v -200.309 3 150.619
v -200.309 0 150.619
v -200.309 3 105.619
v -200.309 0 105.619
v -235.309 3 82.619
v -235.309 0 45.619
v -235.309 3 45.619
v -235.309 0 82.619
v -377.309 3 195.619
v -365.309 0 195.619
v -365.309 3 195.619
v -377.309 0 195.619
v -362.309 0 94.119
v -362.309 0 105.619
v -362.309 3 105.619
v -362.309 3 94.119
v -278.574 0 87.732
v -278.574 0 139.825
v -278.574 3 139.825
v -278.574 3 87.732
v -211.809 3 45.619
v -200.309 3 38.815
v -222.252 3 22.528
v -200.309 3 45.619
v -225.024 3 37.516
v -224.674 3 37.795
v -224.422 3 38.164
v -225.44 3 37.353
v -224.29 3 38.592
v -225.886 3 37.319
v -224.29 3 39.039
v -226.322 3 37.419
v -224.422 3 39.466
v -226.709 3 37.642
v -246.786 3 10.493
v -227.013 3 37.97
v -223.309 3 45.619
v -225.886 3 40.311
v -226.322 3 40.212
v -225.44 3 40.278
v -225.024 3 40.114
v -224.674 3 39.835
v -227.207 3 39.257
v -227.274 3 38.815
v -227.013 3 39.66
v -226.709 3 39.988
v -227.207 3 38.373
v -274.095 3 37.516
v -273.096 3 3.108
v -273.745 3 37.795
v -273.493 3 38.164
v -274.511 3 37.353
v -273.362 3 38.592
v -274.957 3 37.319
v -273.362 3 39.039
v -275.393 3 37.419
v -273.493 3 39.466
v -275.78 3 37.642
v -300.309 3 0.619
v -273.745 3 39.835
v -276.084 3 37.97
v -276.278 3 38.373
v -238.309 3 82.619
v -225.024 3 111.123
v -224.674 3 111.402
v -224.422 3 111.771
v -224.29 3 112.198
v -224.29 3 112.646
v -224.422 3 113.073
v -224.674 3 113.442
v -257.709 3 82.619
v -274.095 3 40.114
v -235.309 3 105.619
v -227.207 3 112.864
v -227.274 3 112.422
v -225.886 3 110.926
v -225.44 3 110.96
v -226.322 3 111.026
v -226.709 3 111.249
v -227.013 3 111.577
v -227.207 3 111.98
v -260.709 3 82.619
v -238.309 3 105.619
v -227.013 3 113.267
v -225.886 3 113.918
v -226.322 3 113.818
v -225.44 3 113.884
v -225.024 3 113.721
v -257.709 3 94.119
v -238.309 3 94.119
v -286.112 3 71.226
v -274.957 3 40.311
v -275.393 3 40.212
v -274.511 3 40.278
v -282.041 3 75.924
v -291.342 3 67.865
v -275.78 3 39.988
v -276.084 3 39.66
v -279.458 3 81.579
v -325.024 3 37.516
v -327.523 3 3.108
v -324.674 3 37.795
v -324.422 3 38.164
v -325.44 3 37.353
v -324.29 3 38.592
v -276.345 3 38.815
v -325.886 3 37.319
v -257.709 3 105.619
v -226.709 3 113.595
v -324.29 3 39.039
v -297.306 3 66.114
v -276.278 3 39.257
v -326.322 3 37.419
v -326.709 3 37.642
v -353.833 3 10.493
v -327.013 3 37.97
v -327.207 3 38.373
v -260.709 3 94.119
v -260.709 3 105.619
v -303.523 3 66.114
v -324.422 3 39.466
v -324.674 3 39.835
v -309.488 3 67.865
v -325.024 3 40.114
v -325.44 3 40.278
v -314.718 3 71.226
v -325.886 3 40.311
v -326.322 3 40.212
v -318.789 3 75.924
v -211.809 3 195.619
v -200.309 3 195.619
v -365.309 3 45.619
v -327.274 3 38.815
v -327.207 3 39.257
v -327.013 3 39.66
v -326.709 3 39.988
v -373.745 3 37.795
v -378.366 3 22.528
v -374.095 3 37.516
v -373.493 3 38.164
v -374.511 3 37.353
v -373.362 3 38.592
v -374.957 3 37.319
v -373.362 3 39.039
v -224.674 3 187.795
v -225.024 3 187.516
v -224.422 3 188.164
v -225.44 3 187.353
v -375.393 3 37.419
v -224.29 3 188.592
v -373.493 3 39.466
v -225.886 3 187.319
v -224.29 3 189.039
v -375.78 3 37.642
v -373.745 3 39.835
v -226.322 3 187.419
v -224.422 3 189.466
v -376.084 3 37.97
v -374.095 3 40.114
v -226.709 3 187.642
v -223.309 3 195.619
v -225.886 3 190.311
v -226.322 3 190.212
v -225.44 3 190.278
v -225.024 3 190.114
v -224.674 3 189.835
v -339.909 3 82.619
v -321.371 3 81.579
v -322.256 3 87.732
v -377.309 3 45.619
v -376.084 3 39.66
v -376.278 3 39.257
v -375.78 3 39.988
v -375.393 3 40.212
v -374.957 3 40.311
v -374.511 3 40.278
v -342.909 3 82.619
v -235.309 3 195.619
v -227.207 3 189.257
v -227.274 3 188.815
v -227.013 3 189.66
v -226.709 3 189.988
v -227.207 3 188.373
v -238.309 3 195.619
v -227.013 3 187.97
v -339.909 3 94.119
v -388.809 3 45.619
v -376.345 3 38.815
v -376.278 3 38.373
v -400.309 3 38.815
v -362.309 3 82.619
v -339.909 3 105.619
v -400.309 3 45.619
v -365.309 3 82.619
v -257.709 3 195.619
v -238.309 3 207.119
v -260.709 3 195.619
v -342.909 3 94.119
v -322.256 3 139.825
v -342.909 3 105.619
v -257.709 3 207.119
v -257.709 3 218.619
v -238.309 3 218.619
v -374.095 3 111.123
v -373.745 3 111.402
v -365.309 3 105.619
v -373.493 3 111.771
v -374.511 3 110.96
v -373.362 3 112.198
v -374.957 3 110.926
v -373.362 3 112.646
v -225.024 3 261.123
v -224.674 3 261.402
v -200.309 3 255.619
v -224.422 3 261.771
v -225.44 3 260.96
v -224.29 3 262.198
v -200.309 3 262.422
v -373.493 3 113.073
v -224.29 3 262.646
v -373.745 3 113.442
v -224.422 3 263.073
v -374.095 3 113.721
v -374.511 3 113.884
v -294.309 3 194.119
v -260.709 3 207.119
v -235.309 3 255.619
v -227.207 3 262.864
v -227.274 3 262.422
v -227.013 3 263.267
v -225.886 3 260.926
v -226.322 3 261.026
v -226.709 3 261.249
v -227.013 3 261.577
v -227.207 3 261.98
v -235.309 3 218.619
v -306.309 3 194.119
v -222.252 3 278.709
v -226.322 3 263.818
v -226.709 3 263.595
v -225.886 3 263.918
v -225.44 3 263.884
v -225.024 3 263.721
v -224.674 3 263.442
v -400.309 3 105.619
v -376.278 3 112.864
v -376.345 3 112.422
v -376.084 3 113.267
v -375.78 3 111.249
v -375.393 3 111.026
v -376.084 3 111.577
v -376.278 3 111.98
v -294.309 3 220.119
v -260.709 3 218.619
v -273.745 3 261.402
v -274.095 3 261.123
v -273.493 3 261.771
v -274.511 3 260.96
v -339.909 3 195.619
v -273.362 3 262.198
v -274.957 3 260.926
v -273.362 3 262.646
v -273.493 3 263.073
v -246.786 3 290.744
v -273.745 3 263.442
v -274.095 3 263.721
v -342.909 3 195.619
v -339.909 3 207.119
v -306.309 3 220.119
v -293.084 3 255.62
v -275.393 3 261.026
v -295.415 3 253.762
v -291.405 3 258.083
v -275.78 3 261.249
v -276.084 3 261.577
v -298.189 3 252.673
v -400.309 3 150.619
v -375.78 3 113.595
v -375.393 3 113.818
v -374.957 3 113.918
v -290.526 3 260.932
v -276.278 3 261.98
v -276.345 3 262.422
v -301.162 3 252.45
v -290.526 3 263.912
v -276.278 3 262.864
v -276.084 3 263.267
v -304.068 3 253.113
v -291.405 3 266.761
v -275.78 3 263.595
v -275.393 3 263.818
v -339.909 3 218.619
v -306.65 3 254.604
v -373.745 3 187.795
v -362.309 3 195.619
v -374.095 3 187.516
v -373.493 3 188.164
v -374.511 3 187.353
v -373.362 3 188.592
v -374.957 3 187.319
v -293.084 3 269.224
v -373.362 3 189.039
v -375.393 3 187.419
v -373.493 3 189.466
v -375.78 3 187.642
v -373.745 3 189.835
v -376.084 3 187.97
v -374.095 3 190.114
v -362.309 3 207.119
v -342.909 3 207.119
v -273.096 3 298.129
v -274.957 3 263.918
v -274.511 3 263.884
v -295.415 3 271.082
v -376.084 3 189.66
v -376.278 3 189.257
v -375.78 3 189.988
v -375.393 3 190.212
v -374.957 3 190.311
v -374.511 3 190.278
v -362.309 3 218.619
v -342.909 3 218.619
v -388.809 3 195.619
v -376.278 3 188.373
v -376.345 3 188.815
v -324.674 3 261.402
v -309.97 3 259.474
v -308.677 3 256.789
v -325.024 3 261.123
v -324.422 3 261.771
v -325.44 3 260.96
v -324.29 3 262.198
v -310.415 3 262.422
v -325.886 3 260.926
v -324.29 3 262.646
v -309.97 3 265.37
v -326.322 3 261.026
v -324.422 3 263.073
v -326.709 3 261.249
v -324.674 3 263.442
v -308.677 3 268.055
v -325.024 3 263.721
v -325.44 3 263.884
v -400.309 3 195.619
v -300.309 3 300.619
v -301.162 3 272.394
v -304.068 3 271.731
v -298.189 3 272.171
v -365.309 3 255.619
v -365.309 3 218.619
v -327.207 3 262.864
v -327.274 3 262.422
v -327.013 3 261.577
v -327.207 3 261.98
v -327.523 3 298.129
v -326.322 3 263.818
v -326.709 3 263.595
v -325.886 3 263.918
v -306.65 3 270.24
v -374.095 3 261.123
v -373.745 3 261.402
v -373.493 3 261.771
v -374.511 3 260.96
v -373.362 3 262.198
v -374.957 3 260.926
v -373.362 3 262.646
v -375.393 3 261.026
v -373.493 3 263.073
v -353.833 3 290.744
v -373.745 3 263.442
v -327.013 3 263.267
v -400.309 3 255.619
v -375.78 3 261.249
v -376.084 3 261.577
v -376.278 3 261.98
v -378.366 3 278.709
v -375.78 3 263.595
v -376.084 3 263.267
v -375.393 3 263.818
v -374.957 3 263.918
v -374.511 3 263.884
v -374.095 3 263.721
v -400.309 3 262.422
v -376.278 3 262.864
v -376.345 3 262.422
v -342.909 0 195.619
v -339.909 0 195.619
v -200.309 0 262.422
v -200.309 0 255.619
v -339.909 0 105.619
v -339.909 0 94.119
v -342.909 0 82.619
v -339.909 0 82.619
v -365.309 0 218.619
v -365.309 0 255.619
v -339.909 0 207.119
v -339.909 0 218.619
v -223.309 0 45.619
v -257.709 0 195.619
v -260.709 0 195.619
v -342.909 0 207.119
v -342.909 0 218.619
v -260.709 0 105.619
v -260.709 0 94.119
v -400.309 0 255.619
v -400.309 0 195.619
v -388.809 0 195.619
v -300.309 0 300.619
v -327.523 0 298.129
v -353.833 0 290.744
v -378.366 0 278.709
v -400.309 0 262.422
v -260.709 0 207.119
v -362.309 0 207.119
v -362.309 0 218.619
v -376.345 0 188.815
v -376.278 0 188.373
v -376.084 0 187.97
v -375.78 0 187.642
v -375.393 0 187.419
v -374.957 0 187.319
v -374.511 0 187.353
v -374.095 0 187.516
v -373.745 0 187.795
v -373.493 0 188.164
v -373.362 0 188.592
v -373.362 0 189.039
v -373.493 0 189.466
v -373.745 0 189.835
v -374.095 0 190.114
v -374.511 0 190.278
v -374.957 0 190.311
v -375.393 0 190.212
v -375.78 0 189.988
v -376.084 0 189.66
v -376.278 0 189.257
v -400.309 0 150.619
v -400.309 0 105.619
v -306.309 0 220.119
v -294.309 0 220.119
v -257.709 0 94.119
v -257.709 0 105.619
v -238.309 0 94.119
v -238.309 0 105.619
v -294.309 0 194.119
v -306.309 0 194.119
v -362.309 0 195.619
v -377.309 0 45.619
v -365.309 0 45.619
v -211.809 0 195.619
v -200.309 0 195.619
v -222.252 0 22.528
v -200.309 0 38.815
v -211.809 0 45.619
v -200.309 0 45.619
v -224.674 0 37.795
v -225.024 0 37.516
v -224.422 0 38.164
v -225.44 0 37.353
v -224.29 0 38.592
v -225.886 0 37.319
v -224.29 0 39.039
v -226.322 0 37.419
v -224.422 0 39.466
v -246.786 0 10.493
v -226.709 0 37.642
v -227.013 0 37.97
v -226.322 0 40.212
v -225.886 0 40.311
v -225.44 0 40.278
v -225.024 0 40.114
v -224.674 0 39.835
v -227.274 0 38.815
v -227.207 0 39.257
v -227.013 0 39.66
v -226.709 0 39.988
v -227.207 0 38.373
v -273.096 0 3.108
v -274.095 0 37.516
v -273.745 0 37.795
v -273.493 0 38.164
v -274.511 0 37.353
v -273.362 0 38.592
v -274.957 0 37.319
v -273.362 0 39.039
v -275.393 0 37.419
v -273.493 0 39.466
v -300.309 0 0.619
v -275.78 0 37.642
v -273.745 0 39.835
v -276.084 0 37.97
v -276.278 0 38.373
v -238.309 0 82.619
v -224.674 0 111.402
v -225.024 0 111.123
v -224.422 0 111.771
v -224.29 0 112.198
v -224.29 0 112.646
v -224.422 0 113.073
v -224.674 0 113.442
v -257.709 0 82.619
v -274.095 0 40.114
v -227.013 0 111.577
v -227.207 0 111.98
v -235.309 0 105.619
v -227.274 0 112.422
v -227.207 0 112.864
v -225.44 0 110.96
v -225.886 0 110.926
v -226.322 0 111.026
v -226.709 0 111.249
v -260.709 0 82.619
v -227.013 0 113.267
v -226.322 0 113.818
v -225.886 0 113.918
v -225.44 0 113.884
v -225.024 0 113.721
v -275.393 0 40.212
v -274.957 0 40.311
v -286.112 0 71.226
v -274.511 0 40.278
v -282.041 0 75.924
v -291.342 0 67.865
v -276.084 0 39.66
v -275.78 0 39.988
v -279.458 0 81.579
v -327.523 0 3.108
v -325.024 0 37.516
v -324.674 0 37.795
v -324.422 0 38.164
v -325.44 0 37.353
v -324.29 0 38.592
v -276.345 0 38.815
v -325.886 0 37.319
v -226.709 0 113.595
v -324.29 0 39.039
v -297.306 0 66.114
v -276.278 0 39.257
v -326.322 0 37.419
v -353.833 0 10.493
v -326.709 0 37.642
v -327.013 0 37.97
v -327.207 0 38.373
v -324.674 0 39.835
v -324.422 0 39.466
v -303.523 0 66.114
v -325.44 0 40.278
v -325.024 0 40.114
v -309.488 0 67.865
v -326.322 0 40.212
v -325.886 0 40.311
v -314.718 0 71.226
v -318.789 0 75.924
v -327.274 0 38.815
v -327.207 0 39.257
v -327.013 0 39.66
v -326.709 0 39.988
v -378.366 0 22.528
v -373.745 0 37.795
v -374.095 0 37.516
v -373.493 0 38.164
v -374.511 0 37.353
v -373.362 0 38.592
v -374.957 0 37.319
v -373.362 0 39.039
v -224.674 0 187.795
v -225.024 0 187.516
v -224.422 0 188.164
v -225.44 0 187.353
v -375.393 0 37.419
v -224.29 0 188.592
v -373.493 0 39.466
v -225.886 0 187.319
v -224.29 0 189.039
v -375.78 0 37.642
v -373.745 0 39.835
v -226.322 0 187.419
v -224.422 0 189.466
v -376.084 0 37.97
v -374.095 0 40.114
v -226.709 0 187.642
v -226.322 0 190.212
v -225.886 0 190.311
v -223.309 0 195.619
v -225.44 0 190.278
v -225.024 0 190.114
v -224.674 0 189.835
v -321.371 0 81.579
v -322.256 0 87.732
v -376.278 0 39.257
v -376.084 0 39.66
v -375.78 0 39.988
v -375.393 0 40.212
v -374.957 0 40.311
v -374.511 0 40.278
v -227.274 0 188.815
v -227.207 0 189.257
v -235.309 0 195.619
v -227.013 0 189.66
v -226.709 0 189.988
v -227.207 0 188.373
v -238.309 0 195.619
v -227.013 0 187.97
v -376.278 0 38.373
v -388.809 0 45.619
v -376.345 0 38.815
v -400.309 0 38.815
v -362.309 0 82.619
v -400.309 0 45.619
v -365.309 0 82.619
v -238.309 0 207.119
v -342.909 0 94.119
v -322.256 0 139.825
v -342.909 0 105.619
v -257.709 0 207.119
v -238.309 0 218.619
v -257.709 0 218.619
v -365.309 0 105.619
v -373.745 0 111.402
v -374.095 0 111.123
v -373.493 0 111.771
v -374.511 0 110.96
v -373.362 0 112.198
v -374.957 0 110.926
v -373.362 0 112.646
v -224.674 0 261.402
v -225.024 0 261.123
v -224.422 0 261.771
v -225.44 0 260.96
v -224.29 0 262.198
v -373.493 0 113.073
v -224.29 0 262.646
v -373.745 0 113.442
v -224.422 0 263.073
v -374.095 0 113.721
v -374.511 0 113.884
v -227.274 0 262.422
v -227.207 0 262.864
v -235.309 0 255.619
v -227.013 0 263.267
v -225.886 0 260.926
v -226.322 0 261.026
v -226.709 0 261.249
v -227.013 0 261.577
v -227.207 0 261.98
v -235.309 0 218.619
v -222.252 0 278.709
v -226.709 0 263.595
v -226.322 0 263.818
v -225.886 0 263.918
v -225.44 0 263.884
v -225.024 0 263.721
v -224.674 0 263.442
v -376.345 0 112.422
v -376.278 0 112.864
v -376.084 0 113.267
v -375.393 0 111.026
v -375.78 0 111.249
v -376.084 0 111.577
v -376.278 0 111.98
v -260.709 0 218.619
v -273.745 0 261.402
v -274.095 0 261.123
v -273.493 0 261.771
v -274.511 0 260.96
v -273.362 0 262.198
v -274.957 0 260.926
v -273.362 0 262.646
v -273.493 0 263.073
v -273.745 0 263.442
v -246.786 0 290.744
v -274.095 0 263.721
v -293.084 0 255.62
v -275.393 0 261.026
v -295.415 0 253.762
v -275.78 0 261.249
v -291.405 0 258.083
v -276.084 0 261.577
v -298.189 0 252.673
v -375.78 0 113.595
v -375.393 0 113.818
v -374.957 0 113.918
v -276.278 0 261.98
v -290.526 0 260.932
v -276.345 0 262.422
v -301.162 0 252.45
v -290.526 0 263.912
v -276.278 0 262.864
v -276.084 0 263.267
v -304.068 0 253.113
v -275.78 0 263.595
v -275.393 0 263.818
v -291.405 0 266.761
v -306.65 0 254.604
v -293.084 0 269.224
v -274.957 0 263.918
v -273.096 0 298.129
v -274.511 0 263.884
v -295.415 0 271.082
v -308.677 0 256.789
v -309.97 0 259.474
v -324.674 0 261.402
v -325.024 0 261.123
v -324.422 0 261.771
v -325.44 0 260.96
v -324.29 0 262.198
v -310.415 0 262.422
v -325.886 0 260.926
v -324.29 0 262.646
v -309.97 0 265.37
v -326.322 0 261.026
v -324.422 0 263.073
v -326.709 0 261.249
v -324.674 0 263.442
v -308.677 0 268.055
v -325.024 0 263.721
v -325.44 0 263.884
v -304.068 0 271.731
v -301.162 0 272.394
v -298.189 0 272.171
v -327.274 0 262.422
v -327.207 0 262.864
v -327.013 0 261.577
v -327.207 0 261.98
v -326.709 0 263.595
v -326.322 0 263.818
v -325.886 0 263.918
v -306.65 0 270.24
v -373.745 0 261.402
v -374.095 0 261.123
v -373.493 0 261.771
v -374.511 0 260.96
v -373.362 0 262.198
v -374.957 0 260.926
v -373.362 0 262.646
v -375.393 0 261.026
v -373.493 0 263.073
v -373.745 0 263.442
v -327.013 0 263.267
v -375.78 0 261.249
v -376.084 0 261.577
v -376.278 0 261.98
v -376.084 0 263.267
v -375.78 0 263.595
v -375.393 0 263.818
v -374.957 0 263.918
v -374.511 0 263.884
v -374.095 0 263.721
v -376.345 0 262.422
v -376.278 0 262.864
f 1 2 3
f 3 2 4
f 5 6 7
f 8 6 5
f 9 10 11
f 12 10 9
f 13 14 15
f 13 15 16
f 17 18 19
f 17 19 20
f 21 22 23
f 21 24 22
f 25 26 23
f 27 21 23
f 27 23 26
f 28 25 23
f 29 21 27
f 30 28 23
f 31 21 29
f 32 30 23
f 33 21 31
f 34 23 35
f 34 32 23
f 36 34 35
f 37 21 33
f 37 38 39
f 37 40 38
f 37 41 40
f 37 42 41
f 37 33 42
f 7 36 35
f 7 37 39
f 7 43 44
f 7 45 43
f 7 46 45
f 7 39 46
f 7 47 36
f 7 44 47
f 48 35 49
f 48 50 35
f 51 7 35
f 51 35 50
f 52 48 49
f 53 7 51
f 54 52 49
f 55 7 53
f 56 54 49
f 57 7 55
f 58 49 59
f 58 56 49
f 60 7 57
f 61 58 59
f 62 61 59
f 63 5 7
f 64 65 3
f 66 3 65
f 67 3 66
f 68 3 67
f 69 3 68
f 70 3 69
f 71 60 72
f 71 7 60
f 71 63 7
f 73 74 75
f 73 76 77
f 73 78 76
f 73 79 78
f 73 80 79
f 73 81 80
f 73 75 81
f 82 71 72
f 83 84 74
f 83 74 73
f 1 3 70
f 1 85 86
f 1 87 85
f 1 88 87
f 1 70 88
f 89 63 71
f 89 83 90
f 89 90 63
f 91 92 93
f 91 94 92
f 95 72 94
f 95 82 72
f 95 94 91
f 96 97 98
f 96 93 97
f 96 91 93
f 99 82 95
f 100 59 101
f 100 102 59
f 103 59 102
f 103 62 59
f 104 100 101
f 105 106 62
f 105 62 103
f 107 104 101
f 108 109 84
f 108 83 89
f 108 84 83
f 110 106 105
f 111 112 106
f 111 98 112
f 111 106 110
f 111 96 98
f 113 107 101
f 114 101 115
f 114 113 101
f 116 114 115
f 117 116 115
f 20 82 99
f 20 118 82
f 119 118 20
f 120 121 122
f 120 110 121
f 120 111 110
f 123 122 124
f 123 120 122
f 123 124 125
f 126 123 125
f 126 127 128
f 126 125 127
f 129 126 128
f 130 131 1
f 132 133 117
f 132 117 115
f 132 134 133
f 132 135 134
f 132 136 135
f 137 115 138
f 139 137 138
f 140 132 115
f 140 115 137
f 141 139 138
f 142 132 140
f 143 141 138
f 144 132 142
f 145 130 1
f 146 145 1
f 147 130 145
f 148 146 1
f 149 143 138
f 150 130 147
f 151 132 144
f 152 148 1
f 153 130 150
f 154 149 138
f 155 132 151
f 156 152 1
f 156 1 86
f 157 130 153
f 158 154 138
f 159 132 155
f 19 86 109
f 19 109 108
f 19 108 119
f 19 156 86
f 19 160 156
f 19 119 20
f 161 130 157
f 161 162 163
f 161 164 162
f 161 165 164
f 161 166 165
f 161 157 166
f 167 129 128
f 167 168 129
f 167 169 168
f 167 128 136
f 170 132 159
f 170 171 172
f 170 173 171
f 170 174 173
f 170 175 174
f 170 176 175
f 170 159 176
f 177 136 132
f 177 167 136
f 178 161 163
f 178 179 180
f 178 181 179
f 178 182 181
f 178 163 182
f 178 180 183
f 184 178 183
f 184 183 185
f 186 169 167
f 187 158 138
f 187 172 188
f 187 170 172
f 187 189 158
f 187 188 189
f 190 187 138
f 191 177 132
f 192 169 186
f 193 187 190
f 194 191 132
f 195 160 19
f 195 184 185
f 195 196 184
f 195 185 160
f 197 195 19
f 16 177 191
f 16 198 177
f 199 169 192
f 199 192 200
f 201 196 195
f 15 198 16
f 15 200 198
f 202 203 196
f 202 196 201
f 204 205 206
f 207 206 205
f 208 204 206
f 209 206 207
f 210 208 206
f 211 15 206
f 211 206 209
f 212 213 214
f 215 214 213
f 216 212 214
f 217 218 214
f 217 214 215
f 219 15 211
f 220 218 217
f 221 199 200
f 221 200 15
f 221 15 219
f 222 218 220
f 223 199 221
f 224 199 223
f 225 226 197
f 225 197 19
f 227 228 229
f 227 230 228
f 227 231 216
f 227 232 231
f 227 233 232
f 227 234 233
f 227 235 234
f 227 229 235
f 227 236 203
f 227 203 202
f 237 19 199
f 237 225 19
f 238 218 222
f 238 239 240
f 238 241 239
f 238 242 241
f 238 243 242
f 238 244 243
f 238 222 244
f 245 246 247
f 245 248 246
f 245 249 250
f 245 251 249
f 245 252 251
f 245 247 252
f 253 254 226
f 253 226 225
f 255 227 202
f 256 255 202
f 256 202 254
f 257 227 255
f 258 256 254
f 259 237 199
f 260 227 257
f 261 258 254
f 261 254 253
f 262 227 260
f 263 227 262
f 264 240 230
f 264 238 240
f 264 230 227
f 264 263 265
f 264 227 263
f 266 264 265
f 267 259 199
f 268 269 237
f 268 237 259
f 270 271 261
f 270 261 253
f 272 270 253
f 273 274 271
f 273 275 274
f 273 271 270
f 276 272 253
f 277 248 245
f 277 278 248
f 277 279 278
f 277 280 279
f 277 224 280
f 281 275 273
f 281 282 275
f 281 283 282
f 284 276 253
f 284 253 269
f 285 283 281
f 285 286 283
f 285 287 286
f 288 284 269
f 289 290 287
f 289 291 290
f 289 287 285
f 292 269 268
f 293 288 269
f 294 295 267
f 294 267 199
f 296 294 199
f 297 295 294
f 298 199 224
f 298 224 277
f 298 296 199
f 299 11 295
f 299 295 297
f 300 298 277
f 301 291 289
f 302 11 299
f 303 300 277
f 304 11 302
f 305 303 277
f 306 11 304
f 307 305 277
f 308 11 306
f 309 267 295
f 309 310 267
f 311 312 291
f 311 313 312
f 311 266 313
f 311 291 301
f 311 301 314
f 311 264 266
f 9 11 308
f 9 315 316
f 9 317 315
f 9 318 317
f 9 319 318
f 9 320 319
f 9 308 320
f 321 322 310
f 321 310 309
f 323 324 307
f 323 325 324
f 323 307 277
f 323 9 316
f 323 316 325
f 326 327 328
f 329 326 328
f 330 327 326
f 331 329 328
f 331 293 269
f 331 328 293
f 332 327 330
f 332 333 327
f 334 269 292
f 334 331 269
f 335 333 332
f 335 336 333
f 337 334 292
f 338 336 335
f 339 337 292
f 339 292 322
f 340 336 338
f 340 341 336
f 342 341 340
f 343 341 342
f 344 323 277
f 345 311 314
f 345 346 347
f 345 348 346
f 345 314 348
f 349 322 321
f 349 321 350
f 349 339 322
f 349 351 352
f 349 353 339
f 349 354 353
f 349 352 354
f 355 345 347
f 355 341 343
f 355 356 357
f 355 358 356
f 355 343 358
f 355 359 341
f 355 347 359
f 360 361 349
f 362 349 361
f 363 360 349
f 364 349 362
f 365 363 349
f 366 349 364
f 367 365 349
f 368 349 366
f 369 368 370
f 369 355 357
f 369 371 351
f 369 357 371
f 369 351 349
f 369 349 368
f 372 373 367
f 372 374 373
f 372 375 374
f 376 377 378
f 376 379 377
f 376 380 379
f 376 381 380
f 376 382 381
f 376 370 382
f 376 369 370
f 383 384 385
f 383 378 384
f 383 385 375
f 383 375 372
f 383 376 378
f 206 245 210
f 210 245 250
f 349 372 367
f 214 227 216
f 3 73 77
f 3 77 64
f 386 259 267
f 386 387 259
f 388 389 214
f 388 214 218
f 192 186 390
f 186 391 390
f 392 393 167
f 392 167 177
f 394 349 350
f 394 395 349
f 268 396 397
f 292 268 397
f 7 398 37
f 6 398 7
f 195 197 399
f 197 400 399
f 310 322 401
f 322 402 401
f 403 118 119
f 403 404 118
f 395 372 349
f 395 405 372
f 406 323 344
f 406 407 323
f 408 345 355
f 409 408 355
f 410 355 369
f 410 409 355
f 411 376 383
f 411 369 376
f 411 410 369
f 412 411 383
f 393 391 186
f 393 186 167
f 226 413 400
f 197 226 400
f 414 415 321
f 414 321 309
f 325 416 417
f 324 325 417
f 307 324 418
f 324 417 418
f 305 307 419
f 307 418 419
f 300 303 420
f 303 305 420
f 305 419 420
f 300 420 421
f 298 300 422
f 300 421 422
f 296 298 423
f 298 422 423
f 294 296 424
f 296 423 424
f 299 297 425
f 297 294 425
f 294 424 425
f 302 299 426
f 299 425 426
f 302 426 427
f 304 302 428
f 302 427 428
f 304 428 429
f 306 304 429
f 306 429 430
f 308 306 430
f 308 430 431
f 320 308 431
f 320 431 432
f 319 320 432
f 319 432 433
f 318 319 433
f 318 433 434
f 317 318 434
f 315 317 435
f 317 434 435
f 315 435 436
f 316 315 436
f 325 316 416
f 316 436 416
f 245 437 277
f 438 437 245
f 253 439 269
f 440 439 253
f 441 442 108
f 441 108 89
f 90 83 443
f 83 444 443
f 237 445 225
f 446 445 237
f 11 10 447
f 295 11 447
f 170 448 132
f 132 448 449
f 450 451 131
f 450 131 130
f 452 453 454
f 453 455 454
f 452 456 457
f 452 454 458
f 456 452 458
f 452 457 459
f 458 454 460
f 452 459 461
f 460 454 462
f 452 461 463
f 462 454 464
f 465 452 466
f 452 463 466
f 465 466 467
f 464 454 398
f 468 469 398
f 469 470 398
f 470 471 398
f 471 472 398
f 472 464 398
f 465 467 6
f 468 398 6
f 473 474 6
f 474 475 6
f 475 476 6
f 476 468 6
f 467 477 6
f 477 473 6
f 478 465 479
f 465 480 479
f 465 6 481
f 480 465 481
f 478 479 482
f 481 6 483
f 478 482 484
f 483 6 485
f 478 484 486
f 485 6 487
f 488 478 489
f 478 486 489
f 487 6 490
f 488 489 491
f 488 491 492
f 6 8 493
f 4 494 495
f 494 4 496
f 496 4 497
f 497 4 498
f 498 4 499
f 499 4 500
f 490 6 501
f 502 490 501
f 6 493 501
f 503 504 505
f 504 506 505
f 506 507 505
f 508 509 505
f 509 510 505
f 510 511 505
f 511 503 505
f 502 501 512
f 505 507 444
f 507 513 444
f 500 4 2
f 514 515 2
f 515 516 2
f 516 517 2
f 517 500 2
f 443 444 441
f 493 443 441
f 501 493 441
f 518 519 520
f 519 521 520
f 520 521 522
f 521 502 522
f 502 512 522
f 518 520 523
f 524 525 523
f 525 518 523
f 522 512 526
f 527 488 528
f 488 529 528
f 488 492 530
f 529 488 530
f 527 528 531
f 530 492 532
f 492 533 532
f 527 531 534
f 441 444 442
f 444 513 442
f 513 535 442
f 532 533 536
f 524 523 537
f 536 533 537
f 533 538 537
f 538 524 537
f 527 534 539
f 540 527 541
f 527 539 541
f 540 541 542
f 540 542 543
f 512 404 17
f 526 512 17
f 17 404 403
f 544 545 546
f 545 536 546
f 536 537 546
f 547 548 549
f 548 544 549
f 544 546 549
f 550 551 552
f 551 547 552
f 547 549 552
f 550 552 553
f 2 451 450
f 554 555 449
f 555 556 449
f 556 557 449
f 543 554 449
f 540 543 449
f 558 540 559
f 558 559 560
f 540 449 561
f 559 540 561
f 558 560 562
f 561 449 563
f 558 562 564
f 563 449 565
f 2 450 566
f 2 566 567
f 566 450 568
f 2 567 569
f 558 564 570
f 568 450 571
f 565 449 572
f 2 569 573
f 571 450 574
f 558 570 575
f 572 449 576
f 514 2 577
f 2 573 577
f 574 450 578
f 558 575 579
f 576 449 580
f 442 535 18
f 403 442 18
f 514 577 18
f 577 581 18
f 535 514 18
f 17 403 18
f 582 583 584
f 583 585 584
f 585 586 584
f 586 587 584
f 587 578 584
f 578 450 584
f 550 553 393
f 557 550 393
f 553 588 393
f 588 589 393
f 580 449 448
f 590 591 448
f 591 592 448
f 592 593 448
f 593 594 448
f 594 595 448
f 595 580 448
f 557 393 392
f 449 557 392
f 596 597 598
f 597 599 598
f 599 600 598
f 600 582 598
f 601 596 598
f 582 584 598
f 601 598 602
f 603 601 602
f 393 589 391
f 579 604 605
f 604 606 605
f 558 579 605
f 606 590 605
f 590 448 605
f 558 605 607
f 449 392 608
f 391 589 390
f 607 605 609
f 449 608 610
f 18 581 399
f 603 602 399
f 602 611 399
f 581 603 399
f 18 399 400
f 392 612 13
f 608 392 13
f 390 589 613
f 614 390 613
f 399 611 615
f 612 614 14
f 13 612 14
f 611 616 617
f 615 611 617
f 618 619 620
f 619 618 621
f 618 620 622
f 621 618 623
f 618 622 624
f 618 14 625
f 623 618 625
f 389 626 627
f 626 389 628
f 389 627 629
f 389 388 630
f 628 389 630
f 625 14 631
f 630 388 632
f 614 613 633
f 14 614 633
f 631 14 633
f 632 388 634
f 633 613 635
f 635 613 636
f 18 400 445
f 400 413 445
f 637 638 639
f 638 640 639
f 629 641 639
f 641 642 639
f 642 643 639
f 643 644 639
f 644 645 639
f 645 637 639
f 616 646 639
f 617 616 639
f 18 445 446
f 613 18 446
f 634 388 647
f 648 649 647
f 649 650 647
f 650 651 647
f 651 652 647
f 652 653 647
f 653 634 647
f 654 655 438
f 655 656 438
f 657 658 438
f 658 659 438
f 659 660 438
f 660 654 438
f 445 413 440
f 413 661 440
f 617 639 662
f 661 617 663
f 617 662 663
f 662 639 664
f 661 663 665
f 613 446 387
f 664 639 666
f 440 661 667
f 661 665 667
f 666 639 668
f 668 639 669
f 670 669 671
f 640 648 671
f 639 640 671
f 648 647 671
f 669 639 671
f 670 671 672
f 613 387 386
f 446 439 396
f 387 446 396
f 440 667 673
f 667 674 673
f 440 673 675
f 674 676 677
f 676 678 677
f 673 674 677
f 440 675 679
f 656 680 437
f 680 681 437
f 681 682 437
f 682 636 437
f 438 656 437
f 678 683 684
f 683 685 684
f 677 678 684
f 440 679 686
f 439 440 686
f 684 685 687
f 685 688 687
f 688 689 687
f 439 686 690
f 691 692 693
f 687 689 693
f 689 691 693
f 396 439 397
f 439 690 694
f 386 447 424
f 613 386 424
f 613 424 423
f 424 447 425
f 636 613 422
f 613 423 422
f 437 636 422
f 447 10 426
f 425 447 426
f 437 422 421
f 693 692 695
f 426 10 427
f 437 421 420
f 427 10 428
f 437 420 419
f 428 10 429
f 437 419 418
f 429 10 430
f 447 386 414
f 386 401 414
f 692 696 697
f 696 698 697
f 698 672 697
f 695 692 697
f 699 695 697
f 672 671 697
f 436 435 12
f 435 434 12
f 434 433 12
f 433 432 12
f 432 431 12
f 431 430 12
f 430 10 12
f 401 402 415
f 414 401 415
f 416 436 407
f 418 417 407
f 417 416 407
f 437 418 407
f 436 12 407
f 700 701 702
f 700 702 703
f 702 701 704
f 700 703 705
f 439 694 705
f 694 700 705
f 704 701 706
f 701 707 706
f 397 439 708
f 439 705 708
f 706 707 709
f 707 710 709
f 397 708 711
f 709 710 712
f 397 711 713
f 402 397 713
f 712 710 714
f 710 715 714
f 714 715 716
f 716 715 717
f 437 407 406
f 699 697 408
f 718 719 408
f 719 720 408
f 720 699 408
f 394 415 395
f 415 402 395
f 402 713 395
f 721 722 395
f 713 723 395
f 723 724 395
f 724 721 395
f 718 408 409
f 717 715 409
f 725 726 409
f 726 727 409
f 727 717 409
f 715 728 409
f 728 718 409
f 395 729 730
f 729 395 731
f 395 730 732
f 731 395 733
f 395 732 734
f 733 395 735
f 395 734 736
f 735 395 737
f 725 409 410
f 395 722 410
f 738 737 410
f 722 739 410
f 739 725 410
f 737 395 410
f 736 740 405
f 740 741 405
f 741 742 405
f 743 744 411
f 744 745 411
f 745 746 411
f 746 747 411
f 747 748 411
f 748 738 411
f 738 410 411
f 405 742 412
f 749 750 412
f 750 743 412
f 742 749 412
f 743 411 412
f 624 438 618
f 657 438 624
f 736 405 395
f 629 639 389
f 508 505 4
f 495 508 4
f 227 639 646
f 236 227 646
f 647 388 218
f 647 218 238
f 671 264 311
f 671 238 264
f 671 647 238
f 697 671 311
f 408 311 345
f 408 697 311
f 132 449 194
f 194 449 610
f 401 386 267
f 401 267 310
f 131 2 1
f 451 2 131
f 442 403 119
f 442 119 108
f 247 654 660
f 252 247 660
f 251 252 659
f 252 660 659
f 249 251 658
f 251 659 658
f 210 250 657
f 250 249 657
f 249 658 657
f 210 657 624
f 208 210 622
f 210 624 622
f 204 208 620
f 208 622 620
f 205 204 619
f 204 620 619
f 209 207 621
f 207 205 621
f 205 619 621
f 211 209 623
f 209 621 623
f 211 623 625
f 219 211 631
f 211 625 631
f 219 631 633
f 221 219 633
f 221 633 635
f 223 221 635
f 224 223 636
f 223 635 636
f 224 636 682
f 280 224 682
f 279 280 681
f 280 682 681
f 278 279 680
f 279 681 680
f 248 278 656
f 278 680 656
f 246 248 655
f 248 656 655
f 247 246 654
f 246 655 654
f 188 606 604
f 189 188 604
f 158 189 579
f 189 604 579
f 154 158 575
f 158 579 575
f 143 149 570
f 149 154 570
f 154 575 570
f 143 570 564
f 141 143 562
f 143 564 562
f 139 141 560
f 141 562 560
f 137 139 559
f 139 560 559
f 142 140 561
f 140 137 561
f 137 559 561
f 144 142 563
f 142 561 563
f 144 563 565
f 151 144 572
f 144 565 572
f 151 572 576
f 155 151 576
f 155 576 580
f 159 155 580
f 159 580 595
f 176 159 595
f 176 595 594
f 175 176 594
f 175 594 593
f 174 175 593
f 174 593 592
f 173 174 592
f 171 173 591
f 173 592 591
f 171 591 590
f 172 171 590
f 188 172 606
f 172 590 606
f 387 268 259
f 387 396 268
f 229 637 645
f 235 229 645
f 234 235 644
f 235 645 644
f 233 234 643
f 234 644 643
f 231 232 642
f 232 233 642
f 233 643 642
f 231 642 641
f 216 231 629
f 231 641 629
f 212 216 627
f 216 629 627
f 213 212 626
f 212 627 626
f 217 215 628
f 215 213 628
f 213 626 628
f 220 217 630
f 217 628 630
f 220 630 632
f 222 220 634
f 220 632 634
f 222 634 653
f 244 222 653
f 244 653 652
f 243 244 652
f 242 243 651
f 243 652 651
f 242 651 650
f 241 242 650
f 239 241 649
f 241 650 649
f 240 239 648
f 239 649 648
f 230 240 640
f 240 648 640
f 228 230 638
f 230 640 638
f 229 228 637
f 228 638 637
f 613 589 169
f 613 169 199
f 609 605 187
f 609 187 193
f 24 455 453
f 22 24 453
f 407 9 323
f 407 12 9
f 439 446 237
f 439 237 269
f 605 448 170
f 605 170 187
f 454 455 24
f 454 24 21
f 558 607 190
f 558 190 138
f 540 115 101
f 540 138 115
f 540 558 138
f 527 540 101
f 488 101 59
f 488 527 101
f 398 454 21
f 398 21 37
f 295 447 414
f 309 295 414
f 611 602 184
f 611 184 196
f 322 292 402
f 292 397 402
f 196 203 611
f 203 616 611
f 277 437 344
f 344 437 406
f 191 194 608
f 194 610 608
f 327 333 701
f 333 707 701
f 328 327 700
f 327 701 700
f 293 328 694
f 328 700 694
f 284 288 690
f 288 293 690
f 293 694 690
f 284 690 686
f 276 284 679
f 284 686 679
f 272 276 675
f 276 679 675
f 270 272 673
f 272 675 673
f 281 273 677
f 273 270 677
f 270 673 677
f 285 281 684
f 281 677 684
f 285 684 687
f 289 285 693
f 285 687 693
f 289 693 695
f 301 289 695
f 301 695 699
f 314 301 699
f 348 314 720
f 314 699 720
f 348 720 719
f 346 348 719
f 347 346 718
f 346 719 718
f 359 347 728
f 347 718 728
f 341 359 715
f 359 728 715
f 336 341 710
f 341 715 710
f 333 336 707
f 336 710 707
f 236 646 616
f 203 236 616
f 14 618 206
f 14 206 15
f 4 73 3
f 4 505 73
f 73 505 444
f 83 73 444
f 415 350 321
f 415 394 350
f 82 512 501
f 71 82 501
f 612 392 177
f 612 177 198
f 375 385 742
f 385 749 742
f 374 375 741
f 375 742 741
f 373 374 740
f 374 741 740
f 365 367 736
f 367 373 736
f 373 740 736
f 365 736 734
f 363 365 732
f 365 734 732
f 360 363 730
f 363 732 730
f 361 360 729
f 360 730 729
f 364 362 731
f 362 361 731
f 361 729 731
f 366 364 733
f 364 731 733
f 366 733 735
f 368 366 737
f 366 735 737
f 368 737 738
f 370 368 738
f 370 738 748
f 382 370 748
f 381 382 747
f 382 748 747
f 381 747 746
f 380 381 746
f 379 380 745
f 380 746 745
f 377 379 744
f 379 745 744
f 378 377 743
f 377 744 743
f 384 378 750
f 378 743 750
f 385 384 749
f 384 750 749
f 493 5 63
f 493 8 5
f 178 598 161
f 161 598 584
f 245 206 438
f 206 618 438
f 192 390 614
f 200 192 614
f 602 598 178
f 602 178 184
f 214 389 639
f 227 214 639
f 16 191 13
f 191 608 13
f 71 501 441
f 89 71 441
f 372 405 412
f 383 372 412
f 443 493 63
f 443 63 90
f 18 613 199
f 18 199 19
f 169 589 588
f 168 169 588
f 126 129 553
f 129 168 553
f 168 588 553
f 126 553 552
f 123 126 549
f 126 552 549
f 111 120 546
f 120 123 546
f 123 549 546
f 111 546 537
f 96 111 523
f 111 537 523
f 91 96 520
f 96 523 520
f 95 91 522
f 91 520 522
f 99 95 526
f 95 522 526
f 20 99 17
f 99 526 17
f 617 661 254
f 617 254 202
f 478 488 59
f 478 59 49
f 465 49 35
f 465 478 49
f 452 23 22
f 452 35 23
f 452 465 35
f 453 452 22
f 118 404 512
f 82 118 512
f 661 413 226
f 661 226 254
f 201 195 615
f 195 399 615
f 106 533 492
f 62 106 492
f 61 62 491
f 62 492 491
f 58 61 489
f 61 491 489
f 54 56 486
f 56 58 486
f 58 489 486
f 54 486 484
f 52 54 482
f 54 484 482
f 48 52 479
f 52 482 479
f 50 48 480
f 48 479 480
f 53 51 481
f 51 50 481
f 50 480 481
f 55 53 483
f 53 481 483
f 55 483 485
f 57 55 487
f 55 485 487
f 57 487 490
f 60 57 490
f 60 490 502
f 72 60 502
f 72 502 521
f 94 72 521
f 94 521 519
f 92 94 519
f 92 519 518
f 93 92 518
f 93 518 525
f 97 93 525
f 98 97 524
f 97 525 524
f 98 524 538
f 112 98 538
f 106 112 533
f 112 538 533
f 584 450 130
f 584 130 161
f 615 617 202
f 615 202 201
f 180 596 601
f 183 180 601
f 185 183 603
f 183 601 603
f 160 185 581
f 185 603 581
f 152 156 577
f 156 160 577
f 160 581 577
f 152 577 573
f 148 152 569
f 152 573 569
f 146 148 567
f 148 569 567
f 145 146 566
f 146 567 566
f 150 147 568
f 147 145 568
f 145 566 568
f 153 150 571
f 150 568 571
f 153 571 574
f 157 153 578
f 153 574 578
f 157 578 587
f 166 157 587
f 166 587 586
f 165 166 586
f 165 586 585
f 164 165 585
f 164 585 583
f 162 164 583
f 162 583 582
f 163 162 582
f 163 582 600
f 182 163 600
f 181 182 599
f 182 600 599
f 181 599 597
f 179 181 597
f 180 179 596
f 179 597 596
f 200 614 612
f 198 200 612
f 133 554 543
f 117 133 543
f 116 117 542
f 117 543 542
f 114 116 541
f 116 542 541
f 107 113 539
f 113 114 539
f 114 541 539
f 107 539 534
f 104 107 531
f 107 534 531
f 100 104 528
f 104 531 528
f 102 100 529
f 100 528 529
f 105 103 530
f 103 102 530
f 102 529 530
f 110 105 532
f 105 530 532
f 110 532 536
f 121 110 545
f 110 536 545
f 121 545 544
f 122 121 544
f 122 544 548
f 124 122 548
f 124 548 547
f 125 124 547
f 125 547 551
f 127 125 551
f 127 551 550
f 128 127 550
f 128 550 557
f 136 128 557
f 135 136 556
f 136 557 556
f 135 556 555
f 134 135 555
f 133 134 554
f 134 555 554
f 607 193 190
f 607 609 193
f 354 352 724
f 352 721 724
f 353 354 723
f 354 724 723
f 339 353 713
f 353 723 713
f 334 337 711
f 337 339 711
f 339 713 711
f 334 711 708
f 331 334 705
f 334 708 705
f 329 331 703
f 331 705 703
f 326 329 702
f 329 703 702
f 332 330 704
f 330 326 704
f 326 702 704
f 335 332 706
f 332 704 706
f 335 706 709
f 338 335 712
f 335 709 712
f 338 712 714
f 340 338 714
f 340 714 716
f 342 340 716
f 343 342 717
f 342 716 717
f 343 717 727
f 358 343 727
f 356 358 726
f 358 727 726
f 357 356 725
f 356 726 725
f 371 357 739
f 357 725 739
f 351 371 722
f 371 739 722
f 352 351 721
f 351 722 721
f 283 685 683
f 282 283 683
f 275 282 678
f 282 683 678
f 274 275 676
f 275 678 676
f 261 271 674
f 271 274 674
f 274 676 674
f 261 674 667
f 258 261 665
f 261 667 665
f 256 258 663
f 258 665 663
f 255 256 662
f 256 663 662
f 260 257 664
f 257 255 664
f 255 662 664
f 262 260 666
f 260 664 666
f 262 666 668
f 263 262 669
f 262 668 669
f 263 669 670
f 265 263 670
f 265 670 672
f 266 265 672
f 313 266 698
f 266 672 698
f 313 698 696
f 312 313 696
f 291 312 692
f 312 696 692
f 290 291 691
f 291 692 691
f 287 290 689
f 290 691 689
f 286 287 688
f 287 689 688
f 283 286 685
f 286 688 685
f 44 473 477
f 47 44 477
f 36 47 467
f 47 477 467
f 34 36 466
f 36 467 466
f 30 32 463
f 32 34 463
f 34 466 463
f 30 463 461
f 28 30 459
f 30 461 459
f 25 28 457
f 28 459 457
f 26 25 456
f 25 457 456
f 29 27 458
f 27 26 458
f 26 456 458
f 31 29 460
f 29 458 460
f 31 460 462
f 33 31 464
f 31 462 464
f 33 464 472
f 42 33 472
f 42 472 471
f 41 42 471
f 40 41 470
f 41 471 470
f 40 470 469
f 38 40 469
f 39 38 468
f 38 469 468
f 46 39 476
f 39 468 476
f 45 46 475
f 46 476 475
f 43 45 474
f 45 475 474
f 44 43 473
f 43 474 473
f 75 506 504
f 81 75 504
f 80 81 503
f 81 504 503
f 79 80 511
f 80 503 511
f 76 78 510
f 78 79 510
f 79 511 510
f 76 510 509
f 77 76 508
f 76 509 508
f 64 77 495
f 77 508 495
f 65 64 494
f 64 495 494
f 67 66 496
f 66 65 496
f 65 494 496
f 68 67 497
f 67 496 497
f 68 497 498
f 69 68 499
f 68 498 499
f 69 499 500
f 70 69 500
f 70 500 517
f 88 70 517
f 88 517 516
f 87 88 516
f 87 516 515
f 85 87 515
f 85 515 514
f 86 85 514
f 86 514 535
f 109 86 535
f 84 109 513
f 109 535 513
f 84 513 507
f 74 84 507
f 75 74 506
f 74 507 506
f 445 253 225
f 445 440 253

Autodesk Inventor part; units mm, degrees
ref_plane "YZ Plane" through (0, 0, 0) normal (1, 0, 0) x (0, 1, 0)
ref_plane "XZ Plane" through (0, 0, 0) normal (0, 1, 0) x (-1, 0, 0)
ref_plane "XY Plane" through (0, 0, 0) normal (0, 0, 1) x (1, 0, 0)
sketch "Sketch1" plane through (0, 0, 0) normal (0, 1, 0) x (-1, 0, 0)
  circle A0 centre (225.7737, 188.8152) radius 1.5
  circle A1 centre (325.7737, 262.422) radius 1.5
  circle A2 centre (374.8449, 262.422) radius 1.5
  circle A3 centre (374.8449, 188.8152) radius 1.5
  circle A4 centre (274.8449, 38.8152) radius 1.5
  circle A5 centre (225.7737, 38.8152) radius 1.5
  circle A6 centre (225.7737, 112.422) radius 1.5
  circle A7 centre (325.7737, 38.8152) radius 1.5
  circle A8 centre (374.8449, 38.8152) radius 1.5
  circle A9 centre (374.8449, 112.422) radius 1.5
  line L0 (200.3093, 45.6186) -> (211.8093, 45.6186)
  line L1 (211.8093, 45.6186) -> (223.3093, 45.6186)
  line L2 (377.3093, 45.6186) -> (388.8093, 45.6186)
  line L3 (388.8093, 45.6186) -> (400.3093, 45.6186)
  line L4 (200.3093, 195.6186) -> (211.8093, 195.6186)
  line L5 (211.8093, 195.6186) -> (223.3093, 195.6186)
  line L6 (377.3093, 195.6186) -> (388.8093, 195.6186)
  line L7 (388.8093, 195.6186) -> (400.3093, 195.6186)
  line L8 (294.3093, 194.1186) -> (306.3093, 194.1186)
  line L9 (306.3093, 194.1186) -> (306.3093, 220.1186)
  line L10 (306.3093, 220.1186) -> (294.3093, 220.1186)
  line L11 (294.3093, 220.1186) -> (294.3093, 194.1186)
  arc A10 (278.5735, 87.7325) -> (322.2559, 87.7325) centre (300.4147, 87.7325) ccw
  circle A11 centre (300.4147, 262.422) radius 10
  line L12 (322.2559, 87.7325) -> (322.2559, 139.8246)
  line L13 (322.2559, 139.8246) -> (278.5735, 139.8246)
  line L14 (278.5735, 139.8246) -> (278.5735, 87.7325)
  circle A12 centre (274.8449, 262.422) radius 1.5
  circle A13 centre (225.7737, 262.422) radius 1.5
  line L15 (238.3093, 105.6186) -> (238.3093, 94.1186)
  line L16 (235.3093, 82.6186) -> (238.3093, 82.6186)
  line L17 (238.3093, 82.6186) -> (238.3093, 94.1186)
  line L18 (362.3093, 105.6186) -> (362.3093, 94.1186)
  line L19 (365.3093, 82.6186) -> (362.3093, 82.6186)
  line L20 (362.3093, 82.6186) -> (362.3093, 94.1186)
  line L21 (235.3093, 195.6186) -> (238.3093, 195.6186)
  line L22 (238.3093, 195.6186) -> (238.3093, 207.1186)
  line L23 (235.3093, 218.6186) -> (238.3093, 218.6186)
  line L24 (238.3093, 218.6186) -> (238.3093, 207.1186)
  line L25 (365.3093, 195.6186) -> (362.3093, 195.6186)
  line L26 (362.3093, 195.6186) -> (362.3093, 207.1186)
  line L27 (365.3093, 218.6186) -> (362.3093, 218.6186)
  line L28 (362.3093, 218.6186) -> (362.3093, 207.1186)
  line L29 (365.3093, 105.6186) -> (362.3093, 105.6186)
  arc A14 (300.3093, 0.6186) -> (400.3093, 38.8152) centre (300.3093, 150.6186) ccw
  arc A15 (200.3093, 38.8152) -> (300.3093, 0.6186) centre (300.3093, 150.6186) ccw
  line L30 (235.3093, 105.6186) -> (200.3093, 105.6186)
  line L31 (200.3093, 45.6186) -> (235.3093, 45.6186)
  line L32 (235.3093, 45.6186) -> (235.3093, 82.6186)
  arc A16 (300.3093, 300.6186) -> (200.3093, 262.422) centre (300.3093, 150.6186) ccw
  line L33 (235.3093, 195.6186) -> (200.3093, 195.6186)
  line L34 (200.3093, 255.6186) -> (235.3093, 255.6186)
  line L35 (235.3093, 255.6186) -> (235.3093, 218.6186)
  line L36 (365.3093, 105.6186) -> (400.3093, 105.6186)
  line L37 (400.3093, 45.6186) -> (365.3093, 45.6186)
  line L38 (365.3093, 45.6186) -> (365.3093, 82.6186)
  arc A17 (400.3093, 262.422) -> (300.3093, 300.6186) centre (300.3093, 150.6186) ccw
  line L39 (365.3093, 195.6186) -> (400.3093, 195.6186)
  line L40 (400.3093, 255.6186) -> (365.3093, 255.6186)
  line L41 (365.3093, 255.6186) -> (365.3093, 218.6186)
  line L42 (235.3093, 105.6186) -> (238.3093, 105.6186)
  line L43 (339.9093, 94.1186) -> (339.9093, 105.6186)
  line L44 (339.9093, 105.6186) -> (342.9093, 105.6186)
  line L45 (342.9093, 105.6186) -> (342.9093, 94.1186)
  line L46 (339.9093, 94.1186) -> (339.9093, 82.6186)
  line L47 (339.9093, 82.6186) -> (342.9093, 82.6186)
  line L48 (342.9093, 82.6186) -> (342.9093, 94.1186)
  line L49 (339.9093, 207.1186) -> (339.9093, 195.6186)
  line L50 (339.9093, 195.6186) -> (342.9093, 195.6186)
  line L51 (342.9093, 195.6186) -> (342.9093, 207.1186)
  line L52 (339.9093, 207.1186) -> (339.9093, 218.6186)
  line L53 (339.9093, 218.6186) -> (342.9093, 218.6186)
  line L54 (342.9093, 218.6186) -> (342.9093, 207.1186)
  line L55 (260.7093, 94.1186) -> (260.7093, 105.6186)
  line L56 (260.7093, 105.6186) -> (257.7093, 105.6186)
  line L57 (257.7093, 105.6186) -> (257.7093, 94.1186)
  line L58 (260.7093, 94.1186) -> (260.7093, 82.6186)
  line L59 (260.7093, 82.6186) -> (257.7093, 82.6186)
  line L60 (257.7093, 82.6186) -> (257.7093, 94.1186)
  line L61 (260.7093, 207.1186) -> (260.7093, 195.6186)
  line L62 (260.7093, 195.6186) -> (257.7093, 195.6186)
  line L63 (257.7093, 195.6186) -> (257.7093, 207.1186)
  line L64 (260.7093, 207.1186) -> (260.7093, 218.6186)
  line L65 (260.7093, 218.6186) -> (257.7093, 218.6186)
  line L66 (257.7093, 218.6186) -> (257.7093, 207.1186)
  line L67 (400.3093, 150.6186) -> (400.3093, 105.6186)
  line L68 (400.3093, 45.6186) -> (400.3093, 38.8152)
  line L69 (211.8093, 0.6186) -> (223.3093, 0.6186)
  line L70 (400.3093, 0.6186) -> (362.3093, 0.6186)
  line L71 (400.3093, 150.6186) -> (400.3093, 195.6186)
  line L72 (400.3093, 255.6186) -> (400.3093, 262.422)
  line L73 (200.3093, 150.6186) -> (200.3093, 195.6186)
  line L74 (200.3093, 150.6186) -> (200.3093, 195.6186)
  line L75 (200.3093, 255.6186) -> (200.3093, 262.422)
  line L76 (200.3093, 255.6186) -> (200.3093, 262.422)
  line L77 (200.3093, 150.6186) -> (200.3093, 105.6186)
  line L78 (200.3093, 45.6186) -> (200.3093, 38.8152)
  line L79 (200.3093, 150.6186) -> (200.3093, 105.6186)
  line L80 (200.3093, 45.6186) -> (200.3093, 38.8152)
extrude "Extrusion1" add sketch "Sketch1" along normal blind 3
properties part number "ChasisSuperior"
